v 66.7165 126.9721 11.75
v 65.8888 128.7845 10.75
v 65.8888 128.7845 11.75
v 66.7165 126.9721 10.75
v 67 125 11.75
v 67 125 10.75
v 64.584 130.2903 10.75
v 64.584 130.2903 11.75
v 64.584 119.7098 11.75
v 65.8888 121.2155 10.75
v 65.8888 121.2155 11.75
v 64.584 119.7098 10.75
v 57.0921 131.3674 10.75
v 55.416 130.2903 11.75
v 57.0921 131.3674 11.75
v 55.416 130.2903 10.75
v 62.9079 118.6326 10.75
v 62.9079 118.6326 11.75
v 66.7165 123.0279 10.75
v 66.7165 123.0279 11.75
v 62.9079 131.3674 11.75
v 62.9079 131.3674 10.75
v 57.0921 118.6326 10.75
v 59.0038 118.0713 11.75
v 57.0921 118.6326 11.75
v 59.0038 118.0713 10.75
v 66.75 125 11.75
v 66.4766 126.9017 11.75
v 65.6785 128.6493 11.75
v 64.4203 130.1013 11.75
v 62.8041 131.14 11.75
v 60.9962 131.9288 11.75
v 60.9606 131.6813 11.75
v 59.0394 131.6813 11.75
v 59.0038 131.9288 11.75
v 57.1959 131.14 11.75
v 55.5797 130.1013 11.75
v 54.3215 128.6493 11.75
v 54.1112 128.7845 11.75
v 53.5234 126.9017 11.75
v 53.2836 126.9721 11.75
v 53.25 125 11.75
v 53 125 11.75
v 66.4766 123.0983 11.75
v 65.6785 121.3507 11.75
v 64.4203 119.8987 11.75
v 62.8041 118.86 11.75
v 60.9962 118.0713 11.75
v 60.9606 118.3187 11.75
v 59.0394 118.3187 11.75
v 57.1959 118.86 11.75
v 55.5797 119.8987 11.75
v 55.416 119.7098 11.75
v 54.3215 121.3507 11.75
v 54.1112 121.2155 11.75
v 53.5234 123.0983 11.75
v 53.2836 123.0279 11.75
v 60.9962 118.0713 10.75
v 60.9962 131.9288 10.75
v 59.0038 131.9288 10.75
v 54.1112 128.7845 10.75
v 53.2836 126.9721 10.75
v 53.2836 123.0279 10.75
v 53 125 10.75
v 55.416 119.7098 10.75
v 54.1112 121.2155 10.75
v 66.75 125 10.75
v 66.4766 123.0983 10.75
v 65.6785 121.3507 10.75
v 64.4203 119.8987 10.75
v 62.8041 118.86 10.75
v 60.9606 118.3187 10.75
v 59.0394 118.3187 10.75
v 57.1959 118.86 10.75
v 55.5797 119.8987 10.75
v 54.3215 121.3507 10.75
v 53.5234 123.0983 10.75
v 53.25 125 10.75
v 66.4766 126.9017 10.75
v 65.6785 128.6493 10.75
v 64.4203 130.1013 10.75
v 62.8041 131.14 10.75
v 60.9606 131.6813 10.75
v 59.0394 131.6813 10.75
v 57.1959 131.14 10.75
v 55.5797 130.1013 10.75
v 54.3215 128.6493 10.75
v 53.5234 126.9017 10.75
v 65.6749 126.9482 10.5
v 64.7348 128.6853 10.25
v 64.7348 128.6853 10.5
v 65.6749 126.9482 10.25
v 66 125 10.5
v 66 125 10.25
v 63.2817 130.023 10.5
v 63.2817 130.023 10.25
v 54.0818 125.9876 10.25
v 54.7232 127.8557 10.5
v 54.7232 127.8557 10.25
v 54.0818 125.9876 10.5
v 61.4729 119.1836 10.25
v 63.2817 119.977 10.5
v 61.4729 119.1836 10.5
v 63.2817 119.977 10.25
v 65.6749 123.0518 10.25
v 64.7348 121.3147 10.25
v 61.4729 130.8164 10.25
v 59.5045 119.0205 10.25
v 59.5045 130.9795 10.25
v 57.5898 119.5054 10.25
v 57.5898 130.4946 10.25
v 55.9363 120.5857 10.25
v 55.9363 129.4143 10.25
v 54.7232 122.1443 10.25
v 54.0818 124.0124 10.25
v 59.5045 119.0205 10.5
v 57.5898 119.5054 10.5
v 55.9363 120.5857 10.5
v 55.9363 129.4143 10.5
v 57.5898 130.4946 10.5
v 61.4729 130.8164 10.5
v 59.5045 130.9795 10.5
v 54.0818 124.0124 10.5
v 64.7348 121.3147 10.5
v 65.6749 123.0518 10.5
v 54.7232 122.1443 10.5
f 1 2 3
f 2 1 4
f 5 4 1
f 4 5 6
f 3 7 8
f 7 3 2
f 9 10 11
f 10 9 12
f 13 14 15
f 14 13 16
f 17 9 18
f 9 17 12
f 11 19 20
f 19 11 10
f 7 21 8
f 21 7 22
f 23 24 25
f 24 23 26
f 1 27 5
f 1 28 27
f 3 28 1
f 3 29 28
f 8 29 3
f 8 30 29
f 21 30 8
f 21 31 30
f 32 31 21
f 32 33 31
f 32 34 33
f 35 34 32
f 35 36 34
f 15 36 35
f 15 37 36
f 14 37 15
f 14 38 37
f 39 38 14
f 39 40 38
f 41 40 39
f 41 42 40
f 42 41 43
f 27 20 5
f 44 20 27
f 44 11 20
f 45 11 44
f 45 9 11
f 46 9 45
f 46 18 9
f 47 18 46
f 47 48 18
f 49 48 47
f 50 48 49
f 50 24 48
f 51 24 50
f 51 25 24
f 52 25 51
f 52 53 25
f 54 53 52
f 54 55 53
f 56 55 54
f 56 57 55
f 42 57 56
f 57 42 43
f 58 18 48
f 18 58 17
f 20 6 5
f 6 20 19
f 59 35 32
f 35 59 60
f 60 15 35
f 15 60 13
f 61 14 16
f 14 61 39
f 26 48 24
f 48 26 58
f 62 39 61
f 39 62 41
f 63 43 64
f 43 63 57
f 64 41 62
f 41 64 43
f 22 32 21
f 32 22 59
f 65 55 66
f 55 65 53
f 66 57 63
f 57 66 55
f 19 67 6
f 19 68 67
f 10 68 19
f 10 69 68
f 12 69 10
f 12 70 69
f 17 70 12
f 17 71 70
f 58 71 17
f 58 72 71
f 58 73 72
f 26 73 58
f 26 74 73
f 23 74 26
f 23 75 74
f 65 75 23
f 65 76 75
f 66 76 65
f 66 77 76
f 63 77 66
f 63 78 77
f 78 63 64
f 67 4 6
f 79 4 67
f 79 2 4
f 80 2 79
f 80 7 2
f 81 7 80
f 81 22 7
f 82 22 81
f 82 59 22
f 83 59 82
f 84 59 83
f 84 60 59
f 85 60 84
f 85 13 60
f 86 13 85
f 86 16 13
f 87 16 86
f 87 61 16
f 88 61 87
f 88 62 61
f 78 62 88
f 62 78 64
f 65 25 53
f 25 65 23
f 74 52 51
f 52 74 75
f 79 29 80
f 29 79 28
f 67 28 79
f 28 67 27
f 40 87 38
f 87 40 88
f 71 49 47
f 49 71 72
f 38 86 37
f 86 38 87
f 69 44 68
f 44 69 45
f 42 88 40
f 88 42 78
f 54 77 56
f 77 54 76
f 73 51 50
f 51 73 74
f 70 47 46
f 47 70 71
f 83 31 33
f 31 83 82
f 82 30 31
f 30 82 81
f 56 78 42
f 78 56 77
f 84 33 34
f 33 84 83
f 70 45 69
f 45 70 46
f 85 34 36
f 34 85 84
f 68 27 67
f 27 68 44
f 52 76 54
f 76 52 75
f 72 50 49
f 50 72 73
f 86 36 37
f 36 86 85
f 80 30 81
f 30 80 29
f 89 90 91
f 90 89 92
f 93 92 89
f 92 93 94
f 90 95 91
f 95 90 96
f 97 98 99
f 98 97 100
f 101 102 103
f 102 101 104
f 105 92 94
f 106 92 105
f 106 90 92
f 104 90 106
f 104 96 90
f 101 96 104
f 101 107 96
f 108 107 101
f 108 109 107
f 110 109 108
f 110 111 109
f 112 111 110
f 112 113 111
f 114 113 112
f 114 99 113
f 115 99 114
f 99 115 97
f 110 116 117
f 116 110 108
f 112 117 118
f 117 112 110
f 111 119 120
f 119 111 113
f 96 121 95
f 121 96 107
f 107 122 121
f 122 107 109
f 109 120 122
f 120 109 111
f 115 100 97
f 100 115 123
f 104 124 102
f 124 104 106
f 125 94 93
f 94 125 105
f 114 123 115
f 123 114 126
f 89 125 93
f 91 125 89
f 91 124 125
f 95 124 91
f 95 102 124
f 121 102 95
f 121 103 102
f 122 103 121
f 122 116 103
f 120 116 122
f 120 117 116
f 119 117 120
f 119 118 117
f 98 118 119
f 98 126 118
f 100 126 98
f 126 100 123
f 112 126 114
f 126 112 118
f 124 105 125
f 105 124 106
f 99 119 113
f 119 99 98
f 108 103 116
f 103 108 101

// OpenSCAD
h_mesa=25; //feet
h_ground=0.25;
h_bases=1   ;
h_1story=3.5;
h_1doors=h_1story*0.9;
echo ("h_1doors",h_1doors);
h_2story=h_1story*2;
h_3story=h_1story*3;
h_35story=h_1story*3.5;
h_375story=h_1story*3.75;
h_4story=h_1story*4;
h_5story=h_1story*5;
h_6story=h_1story*6;
h_7story=h_1story*7;
tallest_tower_height=h_5story * 2;

difference()
    union()
    {
        //color("blue") // Road size test
        //translate([133,200,h_7story])
        //    rotate([0,0,65])
        //        cube([6,6,h_5story*2]);
        //color("red")
        //	linear_extrude(height = 5, center = true, convexity = 10)
        //		import(file = "plan-6b.dxf");
 
// Model 10 -- mesa
        /*color("green")  // The mesa
        difference()
        {
            translate([0,0,-h_mesa])
                linear_extrude(height = h_mesa, center = false, convexity = 10)
                    import(file = "plan-6--mesa.dxf");	
            translate([67,211,-30])
                rotate([55,0,50])
                    cube([50,30,50]);
        }*/

// Model 20 -- road
        /*color("black")  // The road
            linear_extrude(height = h_ground, center = false, convexity = 10)
                import(file = "plan-6--road.dxf");
        */

// Model 30 -- bases
        /*color("red")    // Bases for powerlines, HUGE antenna
            linear_extrude(height = h_bases, center = false, convexity = 10)
                import(file = "plan-6--bases.dxf");
       */
        
// Model 40 -- tallest
        /*color("blue")   // Front tall building with towers
            linear_extrude(height = h_7story, center = false, convexity = 10)
                import(file = "plan-6--0.dxf");
        */

// Model 50 -- central
        /*color("orange")	    // Central building
            difference(){
                linear_extrude(height = h_6story, center = false, convexity = 10)
                    import(file = "plan-6--51.dxf");
                translate([199,120.35,0]) rotate([0,0,-1])
                    cube([6,13,h_6story/2]);
            } */
            
// Model 60 -- additions 1
       // Other edge buildings (newer)     
            /*linear_extrude(height = h_375story, center = false, convexity = 10)
                import(file = "plan-6--77.dxf");
            */
            
// Model 70 -- south
       // Central South building
            /*linear_extrude(height = h_35story, center = false, convexity = 10)
                import(file = "plan-6--102.dxf");
            */
            
// Model 80 -- southeast
       // South East most building
            /*linear_extrude(height = h_3story, center = false, convexity = 10)
                import(file = "plan-6--128.dxf");
            */
            
// Model 85 -- tallest_ante
       // Small Ante building near tallest building
            /*linear_extrude(height = h_3story, center = false, convexity = 10)
                import(file = "plan-6--130.dxf");
            */
            
// Model 90 -- corridors
        /*color("red")
            linear_extrude(height = h_2story, center = false, convexity = 10)
                import(file = "plan-6--153.dxf");
            */
            
// Model 92 -- Entrance
         /*color("red")
            linear_extrude(height = h_2story, center = false, convexity = 10)
                import(file = "plan-6--155.dxf");
                */
                
// Model 94 -- entoffices
        /*color("red")
            linear_extrude(height = h_2story, center = false, convexity = 10)
                import(file = "plan-6--157.dxf");
                */

//Model 96 -- british
        /*color("red")
            linear_extrude(height = h_2story, center = false, convexity = 10)
                import(file = "plan-6--159.dxf");
               */
                
// Model 98 -- east1
        /*color("red")
            linear_extrude(height = h_2story, center = false, convexity = 10)
                import(file = "plan-6--161.dxf");
                */
// Model 99 -- east2
        /*color("red")
            linear_extrude(height = h_2story, center = false, convexity = 10)
                import(file = "plan-6--163.dxf");
                */
                
// Model 100 -- doors
       // Doors     
            /*linear_extrude(height = h_1doors, center = false, convexity = 10)
                import(file = "plan-6--179.dxf");
                */
                
// Model 110 -- assorted1
       // Assorted 1 story buildings
            /*linear_extrude(height = h_1story, center = false, convexity = 10)
                import(file = "plan-6--204.dxf");
                */
                
// Model 120 -- labels1
        // Label blocks
        /*color("white")
            linear_extrude(height = 0.125, center = false, convexity = 10)
                import(file = "plan-6--230.dxf");
        */
        
// Model 130 -- huge_antenna
        /*union(){
        color("blue")    // HUGE antenna
            translate([111.16,162.25,0])
                cylinder(r=2.5, h=h_7story+tallest_tower_height*4, $fn=16);
        // Stack more stuff on top of this
            translate([111.16,162.25,h_7story+tallest_tower_height*2])
            {   
                translate([0,2,0])
                    cylinder(r=5, h=h_2story);
                translate([0,-2,h_2story])
                    cylinder(r=5, h=h_2story);
                translate([0,0,h_4story])
                    cylinder(r=3, h=h_4story);
                translate([0,0,h_1story*8])
                    cylinder(r=5, h=h_3story);
                translate([0,0,h_1story*13  ])
                    cylinder(r=5, h=h_4story);
            }
        } */
        
        
// ========== White towers and domes ==========
        
// Model 150 -- brick_tower
        /*color("red")    // newer Red brick out tower
            translate([60,125,0])
                cylinder(r=5,h=h_35story, $fn=60);
                */
// Model 155 -- brick_tower_dome                
        color("white")
            translate([60,125,h_35story+4]){  
               /*union(){     // Red brick out tower dome                
                    sphere(r=6, $fn=100); 
                    translate([0,0,5.5])  // pip on top
                        cylinder(r=0.5,h=1, $fn=20);
                } */
// Model 157 -- brick_tower_catwalk                
                translate([0,0,-6]){ // catwalk
                    cylinder(r=6, h=0.25);
                    translate([0,0,0.5])
                        difference(){
                            cylinder(r=7, h=1);
                            cylinder(r=6.75, h=6);
                    }
                }
            }  
        
// Model 160 -- west_tower_dome
        /*color("white")
           translate([81,141.75,h_7story+4.5]) // "West" tower
                {
                    sphere(r=10.5);
                    translate([0,0,-5])
                        cylinder(r=11.5,h=0.5);
                    translate([0,0,13])
                        sphere(r=4, $fn=20);
                } */
         
// Model 170 -- north_towers
        /*color("white")
            translate([188.75,226,h_7story]) // "North" towers
            {
                cylinder(r=10,h=tallest_tower_height);
                for (i=[0:1:5])
                    translate ([0,0,i*tallest_tower_height/5])
                        cylinder(r=10.25,h=0.5);
                translate([0,0,tallest_tower_height+11/2]){
                    sphere(r=11, $fn=30);
                    translate([0,0,11+3])
                        sphere(r=4, $fn=20);
                }
                rotate([0,0,14.5]){
                    //cube([70,10,0.5], center=true);
                    translate([-25,-14,0])
                        cube([50,4.5,5]);
                    translate([25,-8,8])
                        sphere(r=11, $fn=30);
                    translate([-25,-8,8])
                        sphere(r=11, $fn=30);
                }
            } */

// Model 180 -- roof_fixtures
        /*color("white")
        {
            translate([225,165,h_6story])  // Disk on center roof
                difference(){
                    cylinder(r=11, h=0.5);
                    cylinder(r=10, h=1);
                }
            translate([232,145,h_6story])  // Center roof Hatch
                cube([2,4,0.5]);
            translate([201,116,h_6story])  // T-roof Hatch
                cube([2,4,0.5]);
        }*/
            
            
         /*color("white"){  // roof derricks
            translate([201,100,h_35story])  
                derrick();
            translate([180,100,h_35story])  
                derrick();
            translate([220,100,h_35story])  
                derrick();
            translate([180,80,h_35story])  
                rotate([0,0,90])
                derrick();
        }*/
            
        //cube([5,5,5]);
        
        //  Render module modules at origin
        //derrick();
    }
    
    module derrick() {
        //beam_angle=100;               //down
        //beam_translation=[0,2.5,3.5];   //down
        beam_angle=0;                   //up
        beam_translation=[0,0,0.5];     //up
        
        translate([0.5,0,0])
            cylinder(r=0.25, h=3, $fn=15);
        translate([-0.5,0,0])
            cylinder(r=0.25, h=3, $fn=15);
        translate(beam_translation)
            rotate([beam_angle,0,0]){
                cylinder(r=0.3, h=7, $fn=15); // The big beam
                translate([0,0,6.4])
                    cylinder(r=0.35,h=0.5, $fn=15); //Sensor thing
                cube([0.7,0.7,0.1], center=true); // weight
            }
        translate([-0.5,0,3.1])
            rotate([0,90,0])
                    cylinder(r=0.1, h=1, $fn=15);
        translate([-0.2,-3,-0.1])
            rotate([20,0,0])
                cube([0.25,0.25,2.2]);
        translate([0,-4.5,0])
            rotate([-20,0,0])
                cube([0.25,0.25,2.2]);
        translate([0,-3.6,1.75])
            difference(){
                cube([0.5,0.5,0.7], center=true);
                cube([0.25,0.6,0.8], center=true);
            }
        }
    
